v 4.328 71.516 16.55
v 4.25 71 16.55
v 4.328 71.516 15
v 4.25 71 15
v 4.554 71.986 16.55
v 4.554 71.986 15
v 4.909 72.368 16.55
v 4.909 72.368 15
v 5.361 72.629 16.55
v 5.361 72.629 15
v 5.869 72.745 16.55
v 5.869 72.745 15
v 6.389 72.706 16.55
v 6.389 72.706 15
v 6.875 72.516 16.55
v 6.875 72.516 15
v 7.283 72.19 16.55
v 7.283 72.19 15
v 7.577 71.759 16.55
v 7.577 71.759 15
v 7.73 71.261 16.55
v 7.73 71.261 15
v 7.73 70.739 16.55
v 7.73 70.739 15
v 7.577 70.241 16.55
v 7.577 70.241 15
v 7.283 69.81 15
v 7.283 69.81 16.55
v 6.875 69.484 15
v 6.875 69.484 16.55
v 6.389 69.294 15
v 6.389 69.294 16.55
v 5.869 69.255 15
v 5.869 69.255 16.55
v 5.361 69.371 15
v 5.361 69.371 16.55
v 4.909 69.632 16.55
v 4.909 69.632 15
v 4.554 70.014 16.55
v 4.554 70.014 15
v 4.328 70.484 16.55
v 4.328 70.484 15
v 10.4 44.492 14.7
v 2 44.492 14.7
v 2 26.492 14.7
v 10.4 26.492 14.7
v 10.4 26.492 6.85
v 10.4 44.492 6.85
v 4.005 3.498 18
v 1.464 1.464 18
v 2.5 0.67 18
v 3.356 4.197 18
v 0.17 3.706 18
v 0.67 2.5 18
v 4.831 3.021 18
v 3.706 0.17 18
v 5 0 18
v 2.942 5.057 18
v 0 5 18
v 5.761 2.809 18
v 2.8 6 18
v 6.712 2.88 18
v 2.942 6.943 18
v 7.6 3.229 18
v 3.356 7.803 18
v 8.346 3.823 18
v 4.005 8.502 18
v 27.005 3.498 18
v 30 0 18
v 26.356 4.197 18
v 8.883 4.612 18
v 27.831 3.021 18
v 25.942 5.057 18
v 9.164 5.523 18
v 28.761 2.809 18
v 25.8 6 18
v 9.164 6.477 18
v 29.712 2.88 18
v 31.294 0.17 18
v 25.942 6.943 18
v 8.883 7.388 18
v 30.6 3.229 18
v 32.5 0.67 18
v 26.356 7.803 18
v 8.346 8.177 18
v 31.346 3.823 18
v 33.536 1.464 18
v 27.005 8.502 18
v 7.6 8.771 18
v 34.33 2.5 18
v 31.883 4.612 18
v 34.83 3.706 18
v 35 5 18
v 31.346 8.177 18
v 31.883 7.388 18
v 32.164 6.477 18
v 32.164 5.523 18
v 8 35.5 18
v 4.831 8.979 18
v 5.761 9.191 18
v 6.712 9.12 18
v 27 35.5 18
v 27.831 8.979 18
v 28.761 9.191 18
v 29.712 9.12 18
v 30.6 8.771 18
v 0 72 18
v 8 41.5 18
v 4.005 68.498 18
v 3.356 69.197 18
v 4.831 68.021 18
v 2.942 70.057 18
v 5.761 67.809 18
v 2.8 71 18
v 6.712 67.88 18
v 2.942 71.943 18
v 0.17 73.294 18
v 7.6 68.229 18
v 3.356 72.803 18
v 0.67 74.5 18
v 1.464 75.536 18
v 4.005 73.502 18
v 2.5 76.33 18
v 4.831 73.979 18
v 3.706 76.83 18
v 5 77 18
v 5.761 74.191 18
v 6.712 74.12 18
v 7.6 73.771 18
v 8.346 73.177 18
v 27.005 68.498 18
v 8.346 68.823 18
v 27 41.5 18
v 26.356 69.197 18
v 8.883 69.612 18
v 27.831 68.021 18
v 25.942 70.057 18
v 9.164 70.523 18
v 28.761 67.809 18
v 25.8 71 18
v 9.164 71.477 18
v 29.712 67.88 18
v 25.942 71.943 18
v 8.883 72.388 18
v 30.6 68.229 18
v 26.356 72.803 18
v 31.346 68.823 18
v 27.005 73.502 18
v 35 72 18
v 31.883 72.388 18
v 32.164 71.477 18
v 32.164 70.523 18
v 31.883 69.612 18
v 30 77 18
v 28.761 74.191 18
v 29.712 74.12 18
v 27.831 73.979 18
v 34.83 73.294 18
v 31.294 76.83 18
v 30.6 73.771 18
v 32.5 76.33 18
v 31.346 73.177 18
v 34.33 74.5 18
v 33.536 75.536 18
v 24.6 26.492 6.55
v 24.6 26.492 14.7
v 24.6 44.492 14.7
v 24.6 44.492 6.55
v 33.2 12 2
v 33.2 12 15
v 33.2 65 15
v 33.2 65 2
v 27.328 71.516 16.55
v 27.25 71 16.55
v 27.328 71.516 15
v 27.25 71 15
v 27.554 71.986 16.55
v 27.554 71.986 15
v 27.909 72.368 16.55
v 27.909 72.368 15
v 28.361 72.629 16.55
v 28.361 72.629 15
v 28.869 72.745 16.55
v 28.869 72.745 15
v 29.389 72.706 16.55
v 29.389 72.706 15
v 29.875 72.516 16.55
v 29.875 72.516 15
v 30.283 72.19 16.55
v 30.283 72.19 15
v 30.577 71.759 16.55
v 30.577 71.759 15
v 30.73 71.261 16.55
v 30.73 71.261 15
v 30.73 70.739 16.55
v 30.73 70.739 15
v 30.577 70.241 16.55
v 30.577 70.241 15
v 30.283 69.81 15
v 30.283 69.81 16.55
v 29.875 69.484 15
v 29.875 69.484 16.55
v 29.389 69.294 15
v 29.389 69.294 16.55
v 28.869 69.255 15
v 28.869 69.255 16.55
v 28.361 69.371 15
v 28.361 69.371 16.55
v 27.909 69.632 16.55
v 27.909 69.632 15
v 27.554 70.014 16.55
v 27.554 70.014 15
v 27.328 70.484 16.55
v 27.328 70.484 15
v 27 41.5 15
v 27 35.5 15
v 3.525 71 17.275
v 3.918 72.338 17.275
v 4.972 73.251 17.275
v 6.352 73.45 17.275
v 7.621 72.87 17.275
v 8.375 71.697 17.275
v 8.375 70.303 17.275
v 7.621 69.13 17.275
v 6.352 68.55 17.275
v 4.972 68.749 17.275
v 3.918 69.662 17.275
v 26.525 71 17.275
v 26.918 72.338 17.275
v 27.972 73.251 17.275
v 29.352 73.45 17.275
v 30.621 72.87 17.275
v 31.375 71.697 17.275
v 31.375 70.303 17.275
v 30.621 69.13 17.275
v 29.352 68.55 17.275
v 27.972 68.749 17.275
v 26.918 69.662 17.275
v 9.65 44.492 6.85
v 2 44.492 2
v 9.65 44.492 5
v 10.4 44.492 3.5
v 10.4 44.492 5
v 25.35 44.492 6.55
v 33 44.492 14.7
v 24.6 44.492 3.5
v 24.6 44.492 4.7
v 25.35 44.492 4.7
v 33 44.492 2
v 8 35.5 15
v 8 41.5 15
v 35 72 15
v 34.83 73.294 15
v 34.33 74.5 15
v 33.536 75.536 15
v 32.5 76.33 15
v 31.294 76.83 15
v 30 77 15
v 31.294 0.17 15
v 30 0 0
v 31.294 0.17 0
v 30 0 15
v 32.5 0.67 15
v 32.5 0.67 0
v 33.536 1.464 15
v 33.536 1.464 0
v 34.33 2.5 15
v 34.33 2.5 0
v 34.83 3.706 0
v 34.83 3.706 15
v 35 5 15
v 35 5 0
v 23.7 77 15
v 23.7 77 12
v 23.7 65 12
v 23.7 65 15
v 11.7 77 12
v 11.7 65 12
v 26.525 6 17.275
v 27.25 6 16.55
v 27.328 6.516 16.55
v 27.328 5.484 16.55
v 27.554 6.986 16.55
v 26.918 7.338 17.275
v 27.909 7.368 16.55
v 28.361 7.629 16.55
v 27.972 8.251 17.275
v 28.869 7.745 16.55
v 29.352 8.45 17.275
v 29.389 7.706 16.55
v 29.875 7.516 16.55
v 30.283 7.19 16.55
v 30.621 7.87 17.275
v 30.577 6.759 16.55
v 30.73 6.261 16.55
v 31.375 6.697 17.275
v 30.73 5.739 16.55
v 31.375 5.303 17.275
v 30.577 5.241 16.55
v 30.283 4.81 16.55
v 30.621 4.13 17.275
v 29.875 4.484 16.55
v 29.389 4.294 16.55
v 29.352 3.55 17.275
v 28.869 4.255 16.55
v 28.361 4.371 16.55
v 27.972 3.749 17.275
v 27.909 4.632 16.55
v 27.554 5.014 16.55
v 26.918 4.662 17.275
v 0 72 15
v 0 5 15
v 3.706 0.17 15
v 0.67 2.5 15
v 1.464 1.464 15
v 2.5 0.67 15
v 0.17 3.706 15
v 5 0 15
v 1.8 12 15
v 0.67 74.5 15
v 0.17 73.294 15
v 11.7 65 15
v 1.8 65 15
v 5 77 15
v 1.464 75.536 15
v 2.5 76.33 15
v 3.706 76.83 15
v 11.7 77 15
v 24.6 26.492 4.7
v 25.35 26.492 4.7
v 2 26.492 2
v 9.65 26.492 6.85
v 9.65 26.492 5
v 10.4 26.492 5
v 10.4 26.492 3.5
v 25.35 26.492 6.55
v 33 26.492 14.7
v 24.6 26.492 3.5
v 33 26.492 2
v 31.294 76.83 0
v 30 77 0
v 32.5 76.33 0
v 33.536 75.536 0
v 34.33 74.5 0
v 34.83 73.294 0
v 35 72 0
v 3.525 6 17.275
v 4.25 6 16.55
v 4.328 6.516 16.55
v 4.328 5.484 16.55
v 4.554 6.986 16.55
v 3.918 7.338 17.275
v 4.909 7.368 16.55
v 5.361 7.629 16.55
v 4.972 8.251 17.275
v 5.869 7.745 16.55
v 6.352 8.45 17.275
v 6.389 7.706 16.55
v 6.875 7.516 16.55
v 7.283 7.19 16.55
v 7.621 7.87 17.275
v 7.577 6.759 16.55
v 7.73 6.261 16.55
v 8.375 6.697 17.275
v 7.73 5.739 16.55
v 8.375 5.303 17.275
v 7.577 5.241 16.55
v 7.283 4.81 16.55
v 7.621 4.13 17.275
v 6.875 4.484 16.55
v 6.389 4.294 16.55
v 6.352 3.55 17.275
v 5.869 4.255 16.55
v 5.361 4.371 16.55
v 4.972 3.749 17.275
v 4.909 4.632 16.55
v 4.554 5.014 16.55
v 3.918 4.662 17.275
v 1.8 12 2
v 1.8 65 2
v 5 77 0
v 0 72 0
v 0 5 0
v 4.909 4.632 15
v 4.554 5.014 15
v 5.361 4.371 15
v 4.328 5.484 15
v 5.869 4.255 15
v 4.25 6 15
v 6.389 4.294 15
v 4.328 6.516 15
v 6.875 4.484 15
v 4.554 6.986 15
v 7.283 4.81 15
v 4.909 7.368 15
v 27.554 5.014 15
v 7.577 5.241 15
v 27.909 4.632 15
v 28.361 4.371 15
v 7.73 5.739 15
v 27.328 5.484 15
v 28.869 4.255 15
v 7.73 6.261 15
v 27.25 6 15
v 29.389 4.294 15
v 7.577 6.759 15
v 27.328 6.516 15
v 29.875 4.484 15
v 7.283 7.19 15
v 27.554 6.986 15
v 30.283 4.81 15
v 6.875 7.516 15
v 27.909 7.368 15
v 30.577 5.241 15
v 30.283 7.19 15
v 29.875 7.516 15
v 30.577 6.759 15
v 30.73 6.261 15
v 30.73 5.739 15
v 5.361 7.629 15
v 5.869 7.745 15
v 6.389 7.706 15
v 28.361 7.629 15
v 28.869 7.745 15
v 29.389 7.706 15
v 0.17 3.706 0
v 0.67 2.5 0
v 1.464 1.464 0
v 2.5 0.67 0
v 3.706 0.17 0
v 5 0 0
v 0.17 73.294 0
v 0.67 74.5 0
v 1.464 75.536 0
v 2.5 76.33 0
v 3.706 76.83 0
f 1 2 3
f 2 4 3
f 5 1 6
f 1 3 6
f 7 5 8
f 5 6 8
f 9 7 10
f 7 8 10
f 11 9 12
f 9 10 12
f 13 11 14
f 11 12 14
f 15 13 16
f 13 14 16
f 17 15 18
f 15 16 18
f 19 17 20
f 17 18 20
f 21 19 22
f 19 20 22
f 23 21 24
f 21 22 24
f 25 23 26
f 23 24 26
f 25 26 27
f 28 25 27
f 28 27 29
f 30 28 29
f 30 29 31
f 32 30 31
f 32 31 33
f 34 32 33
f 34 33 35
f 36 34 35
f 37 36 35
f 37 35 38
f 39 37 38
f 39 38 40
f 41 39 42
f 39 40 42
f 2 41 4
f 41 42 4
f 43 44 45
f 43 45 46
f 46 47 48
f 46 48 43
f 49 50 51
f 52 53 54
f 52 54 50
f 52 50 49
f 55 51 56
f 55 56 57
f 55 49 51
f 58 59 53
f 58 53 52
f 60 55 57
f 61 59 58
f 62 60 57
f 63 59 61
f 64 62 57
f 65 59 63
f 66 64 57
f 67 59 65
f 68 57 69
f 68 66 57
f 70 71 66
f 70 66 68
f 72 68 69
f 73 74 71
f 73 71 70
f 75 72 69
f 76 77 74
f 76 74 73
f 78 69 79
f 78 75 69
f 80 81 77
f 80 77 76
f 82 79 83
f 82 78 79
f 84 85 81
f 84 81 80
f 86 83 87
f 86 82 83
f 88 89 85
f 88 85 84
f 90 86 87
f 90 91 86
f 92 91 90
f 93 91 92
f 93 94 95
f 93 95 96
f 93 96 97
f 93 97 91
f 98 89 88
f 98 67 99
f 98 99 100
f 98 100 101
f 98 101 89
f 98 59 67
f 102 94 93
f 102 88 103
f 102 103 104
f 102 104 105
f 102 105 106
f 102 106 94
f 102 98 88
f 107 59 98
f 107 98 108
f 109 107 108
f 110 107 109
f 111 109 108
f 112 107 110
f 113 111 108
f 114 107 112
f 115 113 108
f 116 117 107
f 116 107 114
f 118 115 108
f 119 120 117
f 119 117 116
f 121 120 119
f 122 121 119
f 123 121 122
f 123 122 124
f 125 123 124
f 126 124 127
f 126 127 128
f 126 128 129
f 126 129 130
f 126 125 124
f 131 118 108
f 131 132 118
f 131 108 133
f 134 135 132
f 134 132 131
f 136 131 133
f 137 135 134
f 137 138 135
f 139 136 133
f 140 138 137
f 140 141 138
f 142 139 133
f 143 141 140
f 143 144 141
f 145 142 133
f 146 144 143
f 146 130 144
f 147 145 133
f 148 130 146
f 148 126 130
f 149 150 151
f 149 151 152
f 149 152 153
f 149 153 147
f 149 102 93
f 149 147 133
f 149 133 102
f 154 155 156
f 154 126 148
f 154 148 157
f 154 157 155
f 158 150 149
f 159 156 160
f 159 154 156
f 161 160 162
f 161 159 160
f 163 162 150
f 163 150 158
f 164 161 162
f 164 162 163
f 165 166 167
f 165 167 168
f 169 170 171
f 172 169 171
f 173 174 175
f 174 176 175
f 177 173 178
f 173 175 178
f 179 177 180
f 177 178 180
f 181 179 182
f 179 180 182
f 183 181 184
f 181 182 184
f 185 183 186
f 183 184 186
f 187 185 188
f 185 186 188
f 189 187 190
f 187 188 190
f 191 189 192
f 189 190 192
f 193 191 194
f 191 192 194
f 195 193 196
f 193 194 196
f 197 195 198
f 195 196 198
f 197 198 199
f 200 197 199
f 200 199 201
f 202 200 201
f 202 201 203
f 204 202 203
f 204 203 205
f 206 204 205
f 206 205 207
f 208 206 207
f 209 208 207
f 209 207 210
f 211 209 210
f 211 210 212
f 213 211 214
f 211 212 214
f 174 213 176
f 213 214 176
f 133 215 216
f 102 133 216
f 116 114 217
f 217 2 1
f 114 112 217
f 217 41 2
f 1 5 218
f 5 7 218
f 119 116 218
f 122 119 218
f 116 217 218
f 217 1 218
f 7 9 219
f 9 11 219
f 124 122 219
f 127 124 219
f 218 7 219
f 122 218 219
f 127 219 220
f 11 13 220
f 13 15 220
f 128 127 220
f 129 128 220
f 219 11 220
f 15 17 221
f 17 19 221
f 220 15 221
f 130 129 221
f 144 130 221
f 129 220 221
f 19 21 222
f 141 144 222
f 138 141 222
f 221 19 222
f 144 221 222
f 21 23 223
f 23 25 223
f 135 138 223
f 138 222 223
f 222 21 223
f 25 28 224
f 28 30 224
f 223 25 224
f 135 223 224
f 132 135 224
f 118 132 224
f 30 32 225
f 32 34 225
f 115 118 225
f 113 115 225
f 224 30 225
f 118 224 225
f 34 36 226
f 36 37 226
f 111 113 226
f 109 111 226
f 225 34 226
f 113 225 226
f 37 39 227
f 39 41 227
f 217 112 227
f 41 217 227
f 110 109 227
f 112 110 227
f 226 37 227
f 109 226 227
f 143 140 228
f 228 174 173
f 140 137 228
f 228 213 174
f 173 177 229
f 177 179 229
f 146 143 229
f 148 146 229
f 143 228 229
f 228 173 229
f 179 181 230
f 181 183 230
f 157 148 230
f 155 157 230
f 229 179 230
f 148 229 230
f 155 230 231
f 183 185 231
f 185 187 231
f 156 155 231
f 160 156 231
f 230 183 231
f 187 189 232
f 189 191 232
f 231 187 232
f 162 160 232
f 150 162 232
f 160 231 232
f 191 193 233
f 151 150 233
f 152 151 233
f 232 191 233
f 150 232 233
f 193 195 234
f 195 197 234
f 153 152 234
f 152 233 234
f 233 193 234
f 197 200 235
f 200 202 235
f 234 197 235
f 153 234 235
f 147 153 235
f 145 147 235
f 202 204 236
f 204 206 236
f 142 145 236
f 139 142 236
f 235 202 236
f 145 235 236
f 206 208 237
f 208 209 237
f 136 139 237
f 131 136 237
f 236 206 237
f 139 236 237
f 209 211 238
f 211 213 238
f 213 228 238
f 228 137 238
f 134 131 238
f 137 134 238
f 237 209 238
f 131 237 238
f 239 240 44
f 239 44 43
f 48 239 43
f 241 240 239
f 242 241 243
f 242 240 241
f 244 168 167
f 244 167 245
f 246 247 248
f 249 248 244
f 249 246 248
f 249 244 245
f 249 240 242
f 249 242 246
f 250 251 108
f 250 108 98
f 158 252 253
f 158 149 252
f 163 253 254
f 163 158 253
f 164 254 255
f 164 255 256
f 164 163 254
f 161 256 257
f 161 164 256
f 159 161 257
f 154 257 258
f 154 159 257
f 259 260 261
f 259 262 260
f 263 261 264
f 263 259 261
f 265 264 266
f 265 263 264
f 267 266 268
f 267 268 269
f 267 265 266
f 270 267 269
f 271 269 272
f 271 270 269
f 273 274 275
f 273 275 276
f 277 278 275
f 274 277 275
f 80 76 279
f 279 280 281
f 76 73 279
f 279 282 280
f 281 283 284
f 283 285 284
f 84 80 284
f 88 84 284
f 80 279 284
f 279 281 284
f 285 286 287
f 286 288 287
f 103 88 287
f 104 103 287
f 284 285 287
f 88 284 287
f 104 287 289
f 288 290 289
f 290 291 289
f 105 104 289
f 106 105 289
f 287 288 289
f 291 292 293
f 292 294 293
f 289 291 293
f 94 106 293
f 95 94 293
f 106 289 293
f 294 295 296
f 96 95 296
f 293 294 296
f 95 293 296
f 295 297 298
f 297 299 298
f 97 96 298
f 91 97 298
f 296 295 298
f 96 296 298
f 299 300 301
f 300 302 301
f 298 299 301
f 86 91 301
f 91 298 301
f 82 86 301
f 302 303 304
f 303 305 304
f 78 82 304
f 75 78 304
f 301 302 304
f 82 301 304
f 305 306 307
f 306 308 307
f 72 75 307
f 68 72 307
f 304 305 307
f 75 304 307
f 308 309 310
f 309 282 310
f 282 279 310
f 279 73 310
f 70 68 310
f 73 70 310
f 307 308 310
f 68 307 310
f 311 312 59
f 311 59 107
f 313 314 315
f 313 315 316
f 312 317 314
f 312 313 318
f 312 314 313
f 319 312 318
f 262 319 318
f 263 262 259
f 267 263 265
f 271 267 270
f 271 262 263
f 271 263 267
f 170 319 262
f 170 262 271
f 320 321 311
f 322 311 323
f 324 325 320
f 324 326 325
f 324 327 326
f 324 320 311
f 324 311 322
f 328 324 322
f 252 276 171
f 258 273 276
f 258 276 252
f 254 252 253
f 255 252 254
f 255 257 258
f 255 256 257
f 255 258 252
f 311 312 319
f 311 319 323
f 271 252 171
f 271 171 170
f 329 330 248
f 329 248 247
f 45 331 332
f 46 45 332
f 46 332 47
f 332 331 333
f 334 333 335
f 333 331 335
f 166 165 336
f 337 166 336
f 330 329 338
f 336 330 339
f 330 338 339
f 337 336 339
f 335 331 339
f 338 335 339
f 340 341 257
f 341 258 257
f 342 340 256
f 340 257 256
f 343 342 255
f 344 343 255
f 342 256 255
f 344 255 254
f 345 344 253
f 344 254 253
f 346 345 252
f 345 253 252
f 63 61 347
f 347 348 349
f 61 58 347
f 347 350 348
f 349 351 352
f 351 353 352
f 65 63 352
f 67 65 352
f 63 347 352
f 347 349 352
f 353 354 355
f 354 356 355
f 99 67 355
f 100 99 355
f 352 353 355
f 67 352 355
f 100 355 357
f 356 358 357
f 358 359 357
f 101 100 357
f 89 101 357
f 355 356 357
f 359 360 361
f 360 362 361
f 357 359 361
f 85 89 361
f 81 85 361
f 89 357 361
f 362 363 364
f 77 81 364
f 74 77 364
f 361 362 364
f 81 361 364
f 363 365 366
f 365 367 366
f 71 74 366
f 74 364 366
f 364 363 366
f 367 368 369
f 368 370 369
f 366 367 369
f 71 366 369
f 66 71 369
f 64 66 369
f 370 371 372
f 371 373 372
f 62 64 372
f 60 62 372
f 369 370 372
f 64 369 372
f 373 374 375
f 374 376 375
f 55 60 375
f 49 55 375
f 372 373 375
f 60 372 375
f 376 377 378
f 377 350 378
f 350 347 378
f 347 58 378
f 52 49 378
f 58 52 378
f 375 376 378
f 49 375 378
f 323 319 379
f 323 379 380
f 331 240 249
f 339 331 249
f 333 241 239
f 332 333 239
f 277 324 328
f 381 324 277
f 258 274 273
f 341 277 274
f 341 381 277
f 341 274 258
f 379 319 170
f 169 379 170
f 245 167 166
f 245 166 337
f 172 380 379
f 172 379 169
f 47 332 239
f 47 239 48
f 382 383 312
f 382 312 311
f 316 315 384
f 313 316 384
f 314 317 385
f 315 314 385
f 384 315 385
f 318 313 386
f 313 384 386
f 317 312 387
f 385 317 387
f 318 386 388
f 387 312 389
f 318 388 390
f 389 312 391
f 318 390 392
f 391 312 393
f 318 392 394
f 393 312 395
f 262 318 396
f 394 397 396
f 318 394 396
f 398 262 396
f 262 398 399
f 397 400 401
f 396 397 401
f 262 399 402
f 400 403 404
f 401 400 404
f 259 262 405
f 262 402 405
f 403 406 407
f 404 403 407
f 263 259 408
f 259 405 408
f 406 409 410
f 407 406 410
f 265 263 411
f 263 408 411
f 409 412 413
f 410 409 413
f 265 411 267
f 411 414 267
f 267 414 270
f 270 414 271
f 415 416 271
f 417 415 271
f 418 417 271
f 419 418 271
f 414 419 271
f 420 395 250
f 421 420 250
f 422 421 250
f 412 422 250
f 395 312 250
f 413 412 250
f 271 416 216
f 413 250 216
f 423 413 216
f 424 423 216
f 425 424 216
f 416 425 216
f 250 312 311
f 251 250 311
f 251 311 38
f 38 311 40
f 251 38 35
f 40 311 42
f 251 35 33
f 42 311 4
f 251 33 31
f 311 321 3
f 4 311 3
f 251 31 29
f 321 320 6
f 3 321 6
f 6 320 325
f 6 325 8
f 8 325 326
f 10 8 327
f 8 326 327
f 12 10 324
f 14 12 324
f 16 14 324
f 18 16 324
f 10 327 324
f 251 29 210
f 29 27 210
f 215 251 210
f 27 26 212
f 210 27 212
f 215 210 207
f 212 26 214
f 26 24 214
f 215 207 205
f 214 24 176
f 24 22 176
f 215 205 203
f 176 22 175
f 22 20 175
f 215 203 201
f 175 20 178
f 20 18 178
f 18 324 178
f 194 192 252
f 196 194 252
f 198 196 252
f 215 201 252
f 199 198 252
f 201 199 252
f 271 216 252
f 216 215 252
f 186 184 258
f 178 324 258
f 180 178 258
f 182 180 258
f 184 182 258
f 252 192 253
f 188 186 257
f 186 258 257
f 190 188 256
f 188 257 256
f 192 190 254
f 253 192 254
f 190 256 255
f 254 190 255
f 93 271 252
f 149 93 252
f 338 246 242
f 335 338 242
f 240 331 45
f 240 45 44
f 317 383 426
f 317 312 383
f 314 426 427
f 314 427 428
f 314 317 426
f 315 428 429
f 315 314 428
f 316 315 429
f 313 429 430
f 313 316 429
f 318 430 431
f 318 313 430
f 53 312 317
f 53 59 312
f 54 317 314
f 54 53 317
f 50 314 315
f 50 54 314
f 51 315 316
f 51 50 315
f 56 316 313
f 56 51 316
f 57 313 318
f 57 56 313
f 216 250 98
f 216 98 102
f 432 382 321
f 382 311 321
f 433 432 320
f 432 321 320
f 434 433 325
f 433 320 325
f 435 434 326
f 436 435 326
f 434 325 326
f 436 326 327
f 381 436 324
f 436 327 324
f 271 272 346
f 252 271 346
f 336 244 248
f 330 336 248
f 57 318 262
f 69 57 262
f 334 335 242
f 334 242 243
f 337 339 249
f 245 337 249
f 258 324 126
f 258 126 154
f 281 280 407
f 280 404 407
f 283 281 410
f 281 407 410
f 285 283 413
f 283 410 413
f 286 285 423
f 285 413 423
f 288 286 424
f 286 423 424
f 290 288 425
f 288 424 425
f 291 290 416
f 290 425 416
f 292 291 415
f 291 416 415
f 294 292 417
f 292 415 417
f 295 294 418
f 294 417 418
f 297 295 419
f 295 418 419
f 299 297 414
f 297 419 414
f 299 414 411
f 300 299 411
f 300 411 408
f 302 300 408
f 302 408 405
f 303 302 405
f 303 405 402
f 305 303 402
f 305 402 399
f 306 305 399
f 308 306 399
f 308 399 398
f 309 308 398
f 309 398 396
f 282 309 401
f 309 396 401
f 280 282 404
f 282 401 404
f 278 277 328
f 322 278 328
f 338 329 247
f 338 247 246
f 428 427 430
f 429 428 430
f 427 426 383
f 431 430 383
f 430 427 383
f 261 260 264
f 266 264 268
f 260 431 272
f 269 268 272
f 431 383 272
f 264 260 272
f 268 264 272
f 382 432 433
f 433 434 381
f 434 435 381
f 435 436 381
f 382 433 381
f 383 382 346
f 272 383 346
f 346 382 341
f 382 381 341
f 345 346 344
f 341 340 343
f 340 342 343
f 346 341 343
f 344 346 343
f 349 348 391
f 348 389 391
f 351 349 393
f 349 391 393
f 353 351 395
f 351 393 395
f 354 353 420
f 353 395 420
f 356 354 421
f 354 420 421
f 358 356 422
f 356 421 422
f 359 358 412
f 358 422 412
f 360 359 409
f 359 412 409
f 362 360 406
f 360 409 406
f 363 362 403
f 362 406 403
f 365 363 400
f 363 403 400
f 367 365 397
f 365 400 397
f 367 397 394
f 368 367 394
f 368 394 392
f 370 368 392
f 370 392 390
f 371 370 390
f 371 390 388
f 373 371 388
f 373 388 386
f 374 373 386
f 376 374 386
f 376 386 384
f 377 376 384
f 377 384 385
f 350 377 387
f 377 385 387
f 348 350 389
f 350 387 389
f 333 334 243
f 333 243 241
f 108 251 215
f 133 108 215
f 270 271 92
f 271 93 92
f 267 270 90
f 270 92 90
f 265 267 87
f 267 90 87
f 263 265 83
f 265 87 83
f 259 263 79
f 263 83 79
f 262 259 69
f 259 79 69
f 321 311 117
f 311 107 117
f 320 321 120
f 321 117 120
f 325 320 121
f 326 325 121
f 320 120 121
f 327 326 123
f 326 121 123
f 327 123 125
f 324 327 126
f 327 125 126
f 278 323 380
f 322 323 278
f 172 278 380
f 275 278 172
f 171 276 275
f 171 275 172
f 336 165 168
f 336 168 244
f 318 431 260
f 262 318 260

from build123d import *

# Parameters (mm, degrees)
F0_W            = 35
F0_H            = 77
F1_DEPTH        = 15
F2_W            = 31.4
F2_H            = 53
F3_DEPTH        = 13
F4_W            = 12
F4_H            = 3
F5_DEPTH        = 25
F7_W            = 35
F7_H            = 77
F8_DEPTH        = 3
F11_D           = 3.5
F11_CSINK_D     = 6.4
F11_CSINK_ANGLE = 90
F12_R           = 5
F12_2_R         = 5
F13_W           = 31
F13_H           = 18
F14_DEPTH       = 12.7
F16_DEPTH       = 18
F9_W            = 19
F9_H            = 6
F17_DEPTH       = 3


# Not quite as in the source:
# - a feature names something its author has since deleted; it is built from what else it names


with BuildPart() as f1:
    # F0 (on Top) → F1 (new body)
    with BuildSketch(Plane.XY):
        with Locations((17.5, 38.5)):
            Rectangle(F0_W, F0_H)
    extrude(amount=F1_DEPTH)

    # F2 (on face) → F3 (cut)
    with BuildSketch(Plane.XY.offset(15)):
        with Locations((17.5, 38.5)):
            Rectangle(F2_W, F2_H)
    extrude(amount=-F3_DEPTH, mode=Mode.SUBTRACT)

    # F4 (on face) → F5 (cut)
    with BuildSketch(Plane.XZ.offset(-65)):
        with Locations((17.7, 13.5)):
            Rectangle(F4_W, F4_H)
    extrude(amount=-F5_DEPTH, mode=Mode.SUBTRACT)

    # F12
    f12_edges = [f1.edges().sort_by_distance(p)[0] for p in [
        (35, 77, 7.5),
        (0, 77, 7.5),
        (35, 0, 7.5),
        (0, 0, 7.5),
    ]]
    fillet(f12_edges, radius=F12_R)


with BuildPart() as f8:
    # F7 (on face) → F8 (new body)
    with BuildSketch(Plane.XY.offset(15)):
        with Locations((17.5, 38.5)):
            Rectangle(F7_W, F7_H)
    extrude(amount=F8_DEPTH)

    # F11 (through all)
    with Locations(Plane.XY.offset(18)):
        with Locations((6, 71), (29, 71), (29, 6), (6, 6)):
            CounterSinkHole(F11_D / 2, F11_CSINK_D / 2, counter_sink_angle=F11_CSINK_ANGLE)

    # F12#2
    f12_2_edges = [f8.edges().sort_by_distance(p)[0] for p in [
        (35, 77, 16.5),
        (0, 77, 16.5),
        (35, 0, 16.5),
        (0, 0, 16.5),
    ]]
    fillet(f12_2_edges, radius=F12_2_R)

    # F9 (on face) → F17 (cut, through all)
    with BuildSketch(Plane(origin=(0, 0, 15), x_dir=(1, 0, 0), z_dir=(0, 0, -1))):
        with Locations((17.5, -38.5)):
            Rectangle(F9_W, F9_H)
    extrude(amount=-F17_DEPTH, mode=Mode.SUBTRACT)


with BuildPart() as f14:
    # F13 (on face) → F14 (new body, through all)
    with BuildSketch(Plane.XY.offset(2)):
        with Locations((17.5, 35.4918729663)):
            Rectangle(F13_W, F13_H)
    extrude(amount=F14_DEPTH)

    # F15 (on face) → F16 (cut, through all)
    with BuildSketch(Plane(origin=(0, 44.4918729663, 0), x_dir=(-1, 0, 0), z_dir=(0, 1, 0))):
        Polygon((-24.6, 14.7), (-24.6, 10), (-24.6, 6.55), (-25.35, 6.55), (-25.35, 4.7), (-24.6, 4.7), (-24.6, 3.5), (-10.4, 3.5), (-10.4, 5), (-9.65, 5), (-9.65, 6.85), (-10.4, 6.85), (-10.4, 10), (-10.4, 14.7), align=None)
    extrude(amount=-F16_DEPTH, mode=Mode.SUBTRACT)


solid = Compound([f1.part, f8.part, f14.part])
